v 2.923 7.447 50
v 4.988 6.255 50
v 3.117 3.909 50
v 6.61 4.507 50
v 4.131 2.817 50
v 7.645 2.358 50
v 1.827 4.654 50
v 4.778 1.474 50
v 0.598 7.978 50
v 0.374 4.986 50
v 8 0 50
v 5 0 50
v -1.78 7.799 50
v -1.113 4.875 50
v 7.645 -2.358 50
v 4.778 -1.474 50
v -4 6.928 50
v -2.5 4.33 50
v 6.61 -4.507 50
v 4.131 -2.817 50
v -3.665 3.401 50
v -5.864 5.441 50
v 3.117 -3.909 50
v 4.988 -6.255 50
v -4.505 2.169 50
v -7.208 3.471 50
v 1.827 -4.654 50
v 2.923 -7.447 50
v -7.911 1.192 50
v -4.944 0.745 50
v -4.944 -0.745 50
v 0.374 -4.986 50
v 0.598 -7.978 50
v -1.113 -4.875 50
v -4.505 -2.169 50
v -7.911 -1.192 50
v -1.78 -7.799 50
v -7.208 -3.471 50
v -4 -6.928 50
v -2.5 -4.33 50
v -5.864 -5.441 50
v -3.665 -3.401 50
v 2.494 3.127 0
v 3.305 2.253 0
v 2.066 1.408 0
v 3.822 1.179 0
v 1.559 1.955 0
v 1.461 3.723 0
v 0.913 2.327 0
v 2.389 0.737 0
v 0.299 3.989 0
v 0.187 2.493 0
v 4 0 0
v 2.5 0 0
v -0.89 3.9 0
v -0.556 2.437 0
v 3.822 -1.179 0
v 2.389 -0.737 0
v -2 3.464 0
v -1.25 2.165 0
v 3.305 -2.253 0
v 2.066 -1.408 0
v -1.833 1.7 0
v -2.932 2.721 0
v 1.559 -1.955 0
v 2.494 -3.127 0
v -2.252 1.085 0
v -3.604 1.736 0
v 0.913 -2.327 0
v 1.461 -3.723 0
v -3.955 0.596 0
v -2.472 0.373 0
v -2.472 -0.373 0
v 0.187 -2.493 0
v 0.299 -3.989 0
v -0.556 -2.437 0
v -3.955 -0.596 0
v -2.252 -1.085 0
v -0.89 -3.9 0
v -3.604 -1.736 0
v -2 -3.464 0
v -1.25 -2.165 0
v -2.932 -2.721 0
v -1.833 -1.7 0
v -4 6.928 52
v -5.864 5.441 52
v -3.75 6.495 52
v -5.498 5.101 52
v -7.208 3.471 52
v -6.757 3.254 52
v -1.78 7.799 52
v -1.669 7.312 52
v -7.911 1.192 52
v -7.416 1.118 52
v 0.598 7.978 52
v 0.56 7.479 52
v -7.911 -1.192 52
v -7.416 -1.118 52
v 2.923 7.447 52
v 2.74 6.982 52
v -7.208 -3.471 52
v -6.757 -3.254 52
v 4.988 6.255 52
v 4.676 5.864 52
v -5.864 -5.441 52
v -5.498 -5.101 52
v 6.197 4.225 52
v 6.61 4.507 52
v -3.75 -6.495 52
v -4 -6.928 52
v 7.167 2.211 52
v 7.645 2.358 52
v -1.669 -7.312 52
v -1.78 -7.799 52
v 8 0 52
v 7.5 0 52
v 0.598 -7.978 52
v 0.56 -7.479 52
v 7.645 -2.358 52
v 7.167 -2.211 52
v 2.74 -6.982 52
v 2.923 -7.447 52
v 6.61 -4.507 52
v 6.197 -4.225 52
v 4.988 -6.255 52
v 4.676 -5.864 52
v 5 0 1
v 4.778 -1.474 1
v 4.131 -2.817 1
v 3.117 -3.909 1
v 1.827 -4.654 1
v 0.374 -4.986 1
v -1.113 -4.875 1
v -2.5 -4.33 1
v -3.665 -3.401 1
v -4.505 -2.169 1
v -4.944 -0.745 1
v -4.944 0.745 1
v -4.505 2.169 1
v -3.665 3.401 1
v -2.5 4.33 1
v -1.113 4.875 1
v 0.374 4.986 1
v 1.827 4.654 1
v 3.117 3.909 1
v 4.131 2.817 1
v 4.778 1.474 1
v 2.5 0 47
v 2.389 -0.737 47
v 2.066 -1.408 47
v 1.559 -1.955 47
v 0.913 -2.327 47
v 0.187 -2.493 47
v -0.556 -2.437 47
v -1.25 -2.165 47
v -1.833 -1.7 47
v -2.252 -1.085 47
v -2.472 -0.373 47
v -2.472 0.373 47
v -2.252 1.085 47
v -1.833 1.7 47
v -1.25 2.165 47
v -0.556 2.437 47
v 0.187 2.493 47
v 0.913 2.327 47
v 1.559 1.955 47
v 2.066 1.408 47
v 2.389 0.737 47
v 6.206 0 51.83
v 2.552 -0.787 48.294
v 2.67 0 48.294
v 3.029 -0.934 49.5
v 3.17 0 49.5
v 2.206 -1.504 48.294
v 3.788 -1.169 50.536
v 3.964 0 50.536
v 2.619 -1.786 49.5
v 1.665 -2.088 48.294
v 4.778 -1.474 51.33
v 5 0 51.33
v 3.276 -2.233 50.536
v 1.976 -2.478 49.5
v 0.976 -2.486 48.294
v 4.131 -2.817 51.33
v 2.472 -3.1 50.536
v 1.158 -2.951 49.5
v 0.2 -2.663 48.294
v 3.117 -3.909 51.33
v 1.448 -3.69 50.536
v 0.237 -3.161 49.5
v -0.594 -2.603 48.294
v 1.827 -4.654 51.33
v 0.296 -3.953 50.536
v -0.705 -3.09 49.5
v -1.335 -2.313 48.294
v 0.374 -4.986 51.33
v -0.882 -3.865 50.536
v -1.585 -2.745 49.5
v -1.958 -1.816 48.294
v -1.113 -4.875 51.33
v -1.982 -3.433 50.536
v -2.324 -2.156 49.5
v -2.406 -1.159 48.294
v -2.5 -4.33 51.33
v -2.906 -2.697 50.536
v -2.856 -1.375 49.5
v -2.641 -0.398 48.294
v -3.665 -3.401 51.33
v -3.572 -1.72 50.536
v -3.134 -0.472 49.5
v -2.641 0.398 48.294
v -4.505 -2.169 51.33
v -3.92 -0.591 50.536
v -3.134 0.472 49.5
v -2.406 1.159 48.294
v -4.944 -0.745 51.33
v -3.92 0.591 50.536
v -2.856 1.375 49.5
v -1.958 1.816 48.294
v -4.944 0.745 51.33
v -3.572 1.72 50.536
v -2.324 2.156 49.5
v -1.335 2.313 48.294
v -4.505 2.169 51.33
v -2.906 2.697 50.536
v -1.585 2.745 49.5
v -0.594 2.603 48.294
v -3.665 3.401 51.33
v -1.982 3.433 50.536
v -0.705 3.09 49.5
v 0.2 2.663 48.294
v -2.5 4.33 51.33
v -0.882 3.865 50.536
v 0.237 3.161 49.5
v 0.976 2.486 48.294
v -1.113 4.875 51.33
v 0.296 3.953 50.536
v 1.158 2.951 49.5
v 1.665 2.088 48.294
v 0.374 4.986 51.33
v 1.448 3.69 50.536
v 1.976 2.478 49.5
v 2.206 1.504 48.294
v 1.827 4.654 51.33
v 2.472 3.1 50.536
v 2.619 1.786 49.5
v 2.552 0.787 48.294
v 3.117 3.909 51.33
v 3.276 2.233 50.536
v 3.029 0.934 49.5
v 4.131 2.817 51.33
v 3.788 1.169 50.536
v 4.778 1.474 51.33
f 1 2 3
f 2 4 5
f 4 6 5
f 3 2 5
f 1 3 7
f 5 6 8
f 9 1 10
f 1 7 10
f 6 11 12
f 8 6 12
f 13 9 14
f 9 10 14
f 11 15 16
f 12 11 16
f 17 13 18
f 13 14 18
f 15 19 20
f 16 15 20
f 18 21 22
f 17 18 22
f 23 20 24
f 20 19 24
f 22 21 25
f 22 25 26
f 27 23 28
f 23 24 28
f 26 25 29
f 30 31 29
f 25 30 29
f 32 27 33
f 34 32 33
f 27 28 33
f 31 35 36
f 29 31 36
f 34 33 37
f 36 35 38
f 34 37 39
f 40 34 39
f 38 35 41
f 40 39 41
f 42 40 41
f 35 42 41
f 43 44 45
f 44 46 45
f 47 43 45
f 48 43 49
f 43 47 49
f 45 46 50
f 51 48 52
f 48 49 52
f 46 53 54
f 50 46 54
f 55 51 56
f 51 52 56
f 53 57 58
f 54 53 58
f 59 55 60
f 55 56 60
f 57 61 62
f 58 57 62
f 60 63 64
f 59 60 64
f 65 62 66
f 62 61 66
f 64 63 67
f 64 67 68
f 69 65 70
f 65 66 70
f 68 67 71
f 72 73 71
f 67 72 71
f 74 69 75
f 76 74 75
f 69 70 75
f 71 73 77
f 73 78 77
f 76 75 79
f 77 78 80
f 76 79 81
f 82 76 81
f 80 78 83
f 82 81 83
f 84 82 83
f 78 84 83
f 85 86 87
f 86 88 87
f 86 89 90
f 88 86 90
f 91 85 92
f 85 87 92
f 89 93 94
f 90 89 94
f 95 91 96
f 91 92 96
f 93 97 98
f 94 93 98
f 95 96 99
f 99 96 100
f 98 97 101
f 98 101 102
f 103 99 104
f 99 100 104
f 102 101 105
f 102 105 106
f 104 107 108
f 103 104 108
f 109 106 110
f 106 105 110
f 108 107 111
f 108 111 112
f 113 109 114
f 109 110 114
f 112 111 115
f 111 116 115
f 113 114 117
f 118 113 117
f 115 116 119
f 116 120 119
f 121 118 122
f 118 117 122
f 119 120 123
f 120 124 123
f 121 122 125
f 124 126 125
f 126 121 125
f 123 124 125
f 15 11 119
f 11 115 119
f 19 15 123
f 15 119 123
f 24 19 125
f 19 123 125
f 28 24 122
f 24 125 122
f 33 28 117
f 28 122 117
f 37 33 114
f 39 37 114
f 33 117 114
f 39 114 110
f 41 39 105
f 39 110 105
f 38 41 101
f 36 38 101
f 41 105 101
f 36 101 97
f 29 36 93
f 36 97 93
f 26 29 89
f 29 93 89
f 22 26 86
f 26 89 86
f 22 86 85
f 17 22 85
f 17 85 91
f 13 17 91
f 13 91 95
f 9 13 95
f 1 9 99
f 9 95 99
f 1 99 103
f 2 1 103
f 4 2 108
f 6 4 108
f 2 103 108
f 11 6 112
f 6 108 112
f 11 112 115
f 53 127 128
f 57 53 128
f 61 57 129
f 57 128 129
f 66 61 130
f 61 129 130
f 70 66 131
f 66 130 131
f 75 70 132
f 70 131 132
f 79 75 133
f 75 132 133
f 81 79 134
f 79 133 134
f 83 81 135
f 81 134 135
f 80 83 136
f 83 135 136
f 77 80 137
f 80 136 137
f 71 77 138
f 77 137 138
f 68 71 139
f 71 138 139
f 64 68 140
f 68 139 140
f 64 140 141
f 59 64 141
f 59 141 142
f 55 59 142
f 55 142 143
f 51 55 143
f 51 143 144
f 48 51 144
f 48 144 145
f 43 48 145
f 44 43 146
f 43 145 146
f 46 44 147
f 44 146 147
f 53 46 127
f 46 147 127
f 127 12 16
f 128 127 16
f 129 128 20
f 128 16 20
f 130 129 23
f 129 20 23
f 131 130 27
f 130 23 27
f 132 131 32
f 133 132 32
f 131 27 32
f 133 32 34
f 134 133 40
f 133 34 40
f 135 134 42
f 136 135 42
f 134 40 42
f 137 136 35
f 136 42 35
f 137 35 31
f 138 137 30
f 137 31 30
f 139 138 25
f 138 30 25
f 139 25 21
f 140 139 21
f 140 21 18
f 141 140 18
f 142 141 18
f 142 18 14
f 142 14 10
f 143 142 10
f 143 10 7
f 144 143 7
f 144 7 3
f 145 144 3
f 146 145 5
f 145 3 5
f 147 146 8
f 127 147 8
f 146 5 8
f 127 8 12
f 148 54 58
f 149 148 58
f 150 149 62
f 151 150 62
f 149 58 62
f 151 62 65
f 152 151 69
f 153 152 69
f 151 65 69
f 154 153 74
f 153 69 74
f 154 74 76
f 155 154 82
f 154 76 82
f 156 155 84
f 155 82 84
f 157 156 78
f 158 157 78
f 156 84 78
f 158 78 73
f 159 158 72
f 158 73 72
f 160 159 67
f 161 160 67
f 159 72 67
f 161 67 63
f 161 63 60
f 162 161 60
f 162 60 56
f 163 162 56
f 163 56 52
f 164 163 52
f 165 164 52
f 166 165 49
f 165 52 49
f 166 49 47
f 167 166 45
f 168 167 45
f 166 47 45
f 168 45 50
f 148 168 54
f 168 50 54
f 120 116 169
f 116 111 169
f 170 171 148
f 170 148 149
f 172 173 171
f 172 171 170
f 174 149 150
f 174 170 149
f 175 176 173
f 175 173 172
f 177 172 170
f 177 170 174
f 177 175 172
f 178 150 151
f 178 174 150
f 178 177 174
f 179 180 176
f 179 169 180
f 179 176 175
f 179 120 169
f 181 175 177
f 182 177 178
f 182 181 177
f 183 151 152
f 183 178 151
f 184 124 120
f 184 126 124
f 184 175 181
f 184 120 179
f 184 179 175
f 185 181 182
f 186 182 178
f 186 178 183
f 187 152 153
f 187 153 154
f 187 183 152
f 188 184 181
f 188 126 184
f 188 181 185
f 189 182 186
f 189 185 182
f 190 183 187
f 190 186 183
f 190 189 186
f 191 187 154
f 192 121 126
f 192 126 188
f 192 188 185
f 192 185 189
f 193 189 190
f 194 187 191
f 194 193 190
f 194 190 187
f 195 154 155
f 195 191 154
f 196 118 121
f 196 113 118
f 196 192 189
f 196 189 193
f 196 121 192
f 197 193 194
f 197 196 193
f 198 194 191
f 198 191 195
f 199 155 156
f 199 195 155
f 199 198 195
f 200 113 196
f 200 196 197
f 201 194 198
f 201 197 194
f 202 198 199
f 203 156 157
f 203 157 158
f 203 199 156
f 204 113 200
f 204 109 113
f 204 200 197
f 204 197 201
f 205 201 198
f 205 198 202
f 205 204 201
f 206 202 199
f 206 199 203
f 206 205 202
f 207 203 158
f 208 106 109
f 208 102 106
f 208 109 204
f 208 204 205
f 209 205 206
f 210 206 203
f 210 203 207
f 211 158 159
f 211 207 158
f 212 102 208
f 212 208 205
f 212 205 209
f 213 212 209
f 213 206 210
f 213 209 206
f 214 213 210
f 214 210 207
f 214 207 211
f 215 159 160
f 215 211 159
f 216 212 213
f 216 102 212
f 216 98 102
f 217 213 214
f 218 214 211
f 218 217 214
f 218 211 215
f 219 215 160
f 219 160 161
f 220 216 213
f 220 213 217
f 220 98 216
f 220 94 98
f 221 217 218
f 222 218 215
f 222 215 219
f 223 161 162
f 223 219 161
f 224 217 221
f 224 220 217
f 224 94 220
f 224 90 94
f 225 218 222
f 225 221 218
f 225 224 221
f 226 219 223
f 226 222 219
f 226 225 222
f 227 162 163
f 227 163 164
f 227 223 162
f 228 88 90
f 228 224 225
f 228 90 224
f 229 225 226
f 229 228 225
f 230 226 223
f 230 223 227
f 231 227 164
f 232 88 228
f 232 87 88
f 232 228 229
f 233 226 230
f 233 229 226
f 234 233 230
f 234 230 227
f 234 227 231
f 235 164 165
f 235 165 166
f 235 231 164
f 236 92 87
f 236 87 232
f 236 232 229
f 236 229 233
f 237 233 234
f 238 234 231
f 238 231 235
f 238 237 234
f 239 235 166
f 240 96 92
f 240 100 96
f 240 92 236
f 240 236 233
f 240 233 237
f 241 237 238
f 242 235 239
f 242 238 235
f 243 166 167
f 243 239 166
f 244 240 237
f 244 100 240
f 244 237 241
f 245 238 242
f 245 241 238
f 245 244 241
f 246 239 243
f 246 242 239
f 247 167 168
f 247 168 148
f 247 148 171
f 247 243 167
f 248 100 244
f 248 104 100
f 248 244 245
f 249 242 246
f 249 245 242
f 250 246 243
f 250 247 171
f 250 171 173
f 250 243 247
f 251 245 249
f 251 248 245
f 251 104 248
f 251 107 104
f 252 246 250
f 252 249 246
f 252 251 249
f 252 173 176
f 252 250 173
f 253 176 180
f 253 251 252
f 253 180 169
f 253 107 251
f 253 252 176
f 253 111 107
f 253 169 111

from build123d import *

# Parameters (mm, degrees)
F2_R    = 5
F3_SIZE = 1


with BuildPart() as f1:
    # F0 (on Front) → F1 (revolve)
    with BuildSketch(Plane.XZ):
        Polygon((2.5, 52), (2.5, 0), (5, 0), (5, 50), (8, 50), (8, 52), align=None)
    revolve(axis=Axis((0, 0, 22.814085), (0, 0, -1)))

    # F2
    f2_edges = [f1.edges().sort_by_distance(p)[0] for p in [
        (-2.5, 0, 52),
    ]]
    fillet(f2_edges, radius=F2_R)

    # F3
    f3_edges = [f1.edges().sort_by_distance(p)[0] for p in [
        (-5, 0, 0),
    ]]
    chamfer(f3_edges, length=F3_SIZE)


solid = f1.part
